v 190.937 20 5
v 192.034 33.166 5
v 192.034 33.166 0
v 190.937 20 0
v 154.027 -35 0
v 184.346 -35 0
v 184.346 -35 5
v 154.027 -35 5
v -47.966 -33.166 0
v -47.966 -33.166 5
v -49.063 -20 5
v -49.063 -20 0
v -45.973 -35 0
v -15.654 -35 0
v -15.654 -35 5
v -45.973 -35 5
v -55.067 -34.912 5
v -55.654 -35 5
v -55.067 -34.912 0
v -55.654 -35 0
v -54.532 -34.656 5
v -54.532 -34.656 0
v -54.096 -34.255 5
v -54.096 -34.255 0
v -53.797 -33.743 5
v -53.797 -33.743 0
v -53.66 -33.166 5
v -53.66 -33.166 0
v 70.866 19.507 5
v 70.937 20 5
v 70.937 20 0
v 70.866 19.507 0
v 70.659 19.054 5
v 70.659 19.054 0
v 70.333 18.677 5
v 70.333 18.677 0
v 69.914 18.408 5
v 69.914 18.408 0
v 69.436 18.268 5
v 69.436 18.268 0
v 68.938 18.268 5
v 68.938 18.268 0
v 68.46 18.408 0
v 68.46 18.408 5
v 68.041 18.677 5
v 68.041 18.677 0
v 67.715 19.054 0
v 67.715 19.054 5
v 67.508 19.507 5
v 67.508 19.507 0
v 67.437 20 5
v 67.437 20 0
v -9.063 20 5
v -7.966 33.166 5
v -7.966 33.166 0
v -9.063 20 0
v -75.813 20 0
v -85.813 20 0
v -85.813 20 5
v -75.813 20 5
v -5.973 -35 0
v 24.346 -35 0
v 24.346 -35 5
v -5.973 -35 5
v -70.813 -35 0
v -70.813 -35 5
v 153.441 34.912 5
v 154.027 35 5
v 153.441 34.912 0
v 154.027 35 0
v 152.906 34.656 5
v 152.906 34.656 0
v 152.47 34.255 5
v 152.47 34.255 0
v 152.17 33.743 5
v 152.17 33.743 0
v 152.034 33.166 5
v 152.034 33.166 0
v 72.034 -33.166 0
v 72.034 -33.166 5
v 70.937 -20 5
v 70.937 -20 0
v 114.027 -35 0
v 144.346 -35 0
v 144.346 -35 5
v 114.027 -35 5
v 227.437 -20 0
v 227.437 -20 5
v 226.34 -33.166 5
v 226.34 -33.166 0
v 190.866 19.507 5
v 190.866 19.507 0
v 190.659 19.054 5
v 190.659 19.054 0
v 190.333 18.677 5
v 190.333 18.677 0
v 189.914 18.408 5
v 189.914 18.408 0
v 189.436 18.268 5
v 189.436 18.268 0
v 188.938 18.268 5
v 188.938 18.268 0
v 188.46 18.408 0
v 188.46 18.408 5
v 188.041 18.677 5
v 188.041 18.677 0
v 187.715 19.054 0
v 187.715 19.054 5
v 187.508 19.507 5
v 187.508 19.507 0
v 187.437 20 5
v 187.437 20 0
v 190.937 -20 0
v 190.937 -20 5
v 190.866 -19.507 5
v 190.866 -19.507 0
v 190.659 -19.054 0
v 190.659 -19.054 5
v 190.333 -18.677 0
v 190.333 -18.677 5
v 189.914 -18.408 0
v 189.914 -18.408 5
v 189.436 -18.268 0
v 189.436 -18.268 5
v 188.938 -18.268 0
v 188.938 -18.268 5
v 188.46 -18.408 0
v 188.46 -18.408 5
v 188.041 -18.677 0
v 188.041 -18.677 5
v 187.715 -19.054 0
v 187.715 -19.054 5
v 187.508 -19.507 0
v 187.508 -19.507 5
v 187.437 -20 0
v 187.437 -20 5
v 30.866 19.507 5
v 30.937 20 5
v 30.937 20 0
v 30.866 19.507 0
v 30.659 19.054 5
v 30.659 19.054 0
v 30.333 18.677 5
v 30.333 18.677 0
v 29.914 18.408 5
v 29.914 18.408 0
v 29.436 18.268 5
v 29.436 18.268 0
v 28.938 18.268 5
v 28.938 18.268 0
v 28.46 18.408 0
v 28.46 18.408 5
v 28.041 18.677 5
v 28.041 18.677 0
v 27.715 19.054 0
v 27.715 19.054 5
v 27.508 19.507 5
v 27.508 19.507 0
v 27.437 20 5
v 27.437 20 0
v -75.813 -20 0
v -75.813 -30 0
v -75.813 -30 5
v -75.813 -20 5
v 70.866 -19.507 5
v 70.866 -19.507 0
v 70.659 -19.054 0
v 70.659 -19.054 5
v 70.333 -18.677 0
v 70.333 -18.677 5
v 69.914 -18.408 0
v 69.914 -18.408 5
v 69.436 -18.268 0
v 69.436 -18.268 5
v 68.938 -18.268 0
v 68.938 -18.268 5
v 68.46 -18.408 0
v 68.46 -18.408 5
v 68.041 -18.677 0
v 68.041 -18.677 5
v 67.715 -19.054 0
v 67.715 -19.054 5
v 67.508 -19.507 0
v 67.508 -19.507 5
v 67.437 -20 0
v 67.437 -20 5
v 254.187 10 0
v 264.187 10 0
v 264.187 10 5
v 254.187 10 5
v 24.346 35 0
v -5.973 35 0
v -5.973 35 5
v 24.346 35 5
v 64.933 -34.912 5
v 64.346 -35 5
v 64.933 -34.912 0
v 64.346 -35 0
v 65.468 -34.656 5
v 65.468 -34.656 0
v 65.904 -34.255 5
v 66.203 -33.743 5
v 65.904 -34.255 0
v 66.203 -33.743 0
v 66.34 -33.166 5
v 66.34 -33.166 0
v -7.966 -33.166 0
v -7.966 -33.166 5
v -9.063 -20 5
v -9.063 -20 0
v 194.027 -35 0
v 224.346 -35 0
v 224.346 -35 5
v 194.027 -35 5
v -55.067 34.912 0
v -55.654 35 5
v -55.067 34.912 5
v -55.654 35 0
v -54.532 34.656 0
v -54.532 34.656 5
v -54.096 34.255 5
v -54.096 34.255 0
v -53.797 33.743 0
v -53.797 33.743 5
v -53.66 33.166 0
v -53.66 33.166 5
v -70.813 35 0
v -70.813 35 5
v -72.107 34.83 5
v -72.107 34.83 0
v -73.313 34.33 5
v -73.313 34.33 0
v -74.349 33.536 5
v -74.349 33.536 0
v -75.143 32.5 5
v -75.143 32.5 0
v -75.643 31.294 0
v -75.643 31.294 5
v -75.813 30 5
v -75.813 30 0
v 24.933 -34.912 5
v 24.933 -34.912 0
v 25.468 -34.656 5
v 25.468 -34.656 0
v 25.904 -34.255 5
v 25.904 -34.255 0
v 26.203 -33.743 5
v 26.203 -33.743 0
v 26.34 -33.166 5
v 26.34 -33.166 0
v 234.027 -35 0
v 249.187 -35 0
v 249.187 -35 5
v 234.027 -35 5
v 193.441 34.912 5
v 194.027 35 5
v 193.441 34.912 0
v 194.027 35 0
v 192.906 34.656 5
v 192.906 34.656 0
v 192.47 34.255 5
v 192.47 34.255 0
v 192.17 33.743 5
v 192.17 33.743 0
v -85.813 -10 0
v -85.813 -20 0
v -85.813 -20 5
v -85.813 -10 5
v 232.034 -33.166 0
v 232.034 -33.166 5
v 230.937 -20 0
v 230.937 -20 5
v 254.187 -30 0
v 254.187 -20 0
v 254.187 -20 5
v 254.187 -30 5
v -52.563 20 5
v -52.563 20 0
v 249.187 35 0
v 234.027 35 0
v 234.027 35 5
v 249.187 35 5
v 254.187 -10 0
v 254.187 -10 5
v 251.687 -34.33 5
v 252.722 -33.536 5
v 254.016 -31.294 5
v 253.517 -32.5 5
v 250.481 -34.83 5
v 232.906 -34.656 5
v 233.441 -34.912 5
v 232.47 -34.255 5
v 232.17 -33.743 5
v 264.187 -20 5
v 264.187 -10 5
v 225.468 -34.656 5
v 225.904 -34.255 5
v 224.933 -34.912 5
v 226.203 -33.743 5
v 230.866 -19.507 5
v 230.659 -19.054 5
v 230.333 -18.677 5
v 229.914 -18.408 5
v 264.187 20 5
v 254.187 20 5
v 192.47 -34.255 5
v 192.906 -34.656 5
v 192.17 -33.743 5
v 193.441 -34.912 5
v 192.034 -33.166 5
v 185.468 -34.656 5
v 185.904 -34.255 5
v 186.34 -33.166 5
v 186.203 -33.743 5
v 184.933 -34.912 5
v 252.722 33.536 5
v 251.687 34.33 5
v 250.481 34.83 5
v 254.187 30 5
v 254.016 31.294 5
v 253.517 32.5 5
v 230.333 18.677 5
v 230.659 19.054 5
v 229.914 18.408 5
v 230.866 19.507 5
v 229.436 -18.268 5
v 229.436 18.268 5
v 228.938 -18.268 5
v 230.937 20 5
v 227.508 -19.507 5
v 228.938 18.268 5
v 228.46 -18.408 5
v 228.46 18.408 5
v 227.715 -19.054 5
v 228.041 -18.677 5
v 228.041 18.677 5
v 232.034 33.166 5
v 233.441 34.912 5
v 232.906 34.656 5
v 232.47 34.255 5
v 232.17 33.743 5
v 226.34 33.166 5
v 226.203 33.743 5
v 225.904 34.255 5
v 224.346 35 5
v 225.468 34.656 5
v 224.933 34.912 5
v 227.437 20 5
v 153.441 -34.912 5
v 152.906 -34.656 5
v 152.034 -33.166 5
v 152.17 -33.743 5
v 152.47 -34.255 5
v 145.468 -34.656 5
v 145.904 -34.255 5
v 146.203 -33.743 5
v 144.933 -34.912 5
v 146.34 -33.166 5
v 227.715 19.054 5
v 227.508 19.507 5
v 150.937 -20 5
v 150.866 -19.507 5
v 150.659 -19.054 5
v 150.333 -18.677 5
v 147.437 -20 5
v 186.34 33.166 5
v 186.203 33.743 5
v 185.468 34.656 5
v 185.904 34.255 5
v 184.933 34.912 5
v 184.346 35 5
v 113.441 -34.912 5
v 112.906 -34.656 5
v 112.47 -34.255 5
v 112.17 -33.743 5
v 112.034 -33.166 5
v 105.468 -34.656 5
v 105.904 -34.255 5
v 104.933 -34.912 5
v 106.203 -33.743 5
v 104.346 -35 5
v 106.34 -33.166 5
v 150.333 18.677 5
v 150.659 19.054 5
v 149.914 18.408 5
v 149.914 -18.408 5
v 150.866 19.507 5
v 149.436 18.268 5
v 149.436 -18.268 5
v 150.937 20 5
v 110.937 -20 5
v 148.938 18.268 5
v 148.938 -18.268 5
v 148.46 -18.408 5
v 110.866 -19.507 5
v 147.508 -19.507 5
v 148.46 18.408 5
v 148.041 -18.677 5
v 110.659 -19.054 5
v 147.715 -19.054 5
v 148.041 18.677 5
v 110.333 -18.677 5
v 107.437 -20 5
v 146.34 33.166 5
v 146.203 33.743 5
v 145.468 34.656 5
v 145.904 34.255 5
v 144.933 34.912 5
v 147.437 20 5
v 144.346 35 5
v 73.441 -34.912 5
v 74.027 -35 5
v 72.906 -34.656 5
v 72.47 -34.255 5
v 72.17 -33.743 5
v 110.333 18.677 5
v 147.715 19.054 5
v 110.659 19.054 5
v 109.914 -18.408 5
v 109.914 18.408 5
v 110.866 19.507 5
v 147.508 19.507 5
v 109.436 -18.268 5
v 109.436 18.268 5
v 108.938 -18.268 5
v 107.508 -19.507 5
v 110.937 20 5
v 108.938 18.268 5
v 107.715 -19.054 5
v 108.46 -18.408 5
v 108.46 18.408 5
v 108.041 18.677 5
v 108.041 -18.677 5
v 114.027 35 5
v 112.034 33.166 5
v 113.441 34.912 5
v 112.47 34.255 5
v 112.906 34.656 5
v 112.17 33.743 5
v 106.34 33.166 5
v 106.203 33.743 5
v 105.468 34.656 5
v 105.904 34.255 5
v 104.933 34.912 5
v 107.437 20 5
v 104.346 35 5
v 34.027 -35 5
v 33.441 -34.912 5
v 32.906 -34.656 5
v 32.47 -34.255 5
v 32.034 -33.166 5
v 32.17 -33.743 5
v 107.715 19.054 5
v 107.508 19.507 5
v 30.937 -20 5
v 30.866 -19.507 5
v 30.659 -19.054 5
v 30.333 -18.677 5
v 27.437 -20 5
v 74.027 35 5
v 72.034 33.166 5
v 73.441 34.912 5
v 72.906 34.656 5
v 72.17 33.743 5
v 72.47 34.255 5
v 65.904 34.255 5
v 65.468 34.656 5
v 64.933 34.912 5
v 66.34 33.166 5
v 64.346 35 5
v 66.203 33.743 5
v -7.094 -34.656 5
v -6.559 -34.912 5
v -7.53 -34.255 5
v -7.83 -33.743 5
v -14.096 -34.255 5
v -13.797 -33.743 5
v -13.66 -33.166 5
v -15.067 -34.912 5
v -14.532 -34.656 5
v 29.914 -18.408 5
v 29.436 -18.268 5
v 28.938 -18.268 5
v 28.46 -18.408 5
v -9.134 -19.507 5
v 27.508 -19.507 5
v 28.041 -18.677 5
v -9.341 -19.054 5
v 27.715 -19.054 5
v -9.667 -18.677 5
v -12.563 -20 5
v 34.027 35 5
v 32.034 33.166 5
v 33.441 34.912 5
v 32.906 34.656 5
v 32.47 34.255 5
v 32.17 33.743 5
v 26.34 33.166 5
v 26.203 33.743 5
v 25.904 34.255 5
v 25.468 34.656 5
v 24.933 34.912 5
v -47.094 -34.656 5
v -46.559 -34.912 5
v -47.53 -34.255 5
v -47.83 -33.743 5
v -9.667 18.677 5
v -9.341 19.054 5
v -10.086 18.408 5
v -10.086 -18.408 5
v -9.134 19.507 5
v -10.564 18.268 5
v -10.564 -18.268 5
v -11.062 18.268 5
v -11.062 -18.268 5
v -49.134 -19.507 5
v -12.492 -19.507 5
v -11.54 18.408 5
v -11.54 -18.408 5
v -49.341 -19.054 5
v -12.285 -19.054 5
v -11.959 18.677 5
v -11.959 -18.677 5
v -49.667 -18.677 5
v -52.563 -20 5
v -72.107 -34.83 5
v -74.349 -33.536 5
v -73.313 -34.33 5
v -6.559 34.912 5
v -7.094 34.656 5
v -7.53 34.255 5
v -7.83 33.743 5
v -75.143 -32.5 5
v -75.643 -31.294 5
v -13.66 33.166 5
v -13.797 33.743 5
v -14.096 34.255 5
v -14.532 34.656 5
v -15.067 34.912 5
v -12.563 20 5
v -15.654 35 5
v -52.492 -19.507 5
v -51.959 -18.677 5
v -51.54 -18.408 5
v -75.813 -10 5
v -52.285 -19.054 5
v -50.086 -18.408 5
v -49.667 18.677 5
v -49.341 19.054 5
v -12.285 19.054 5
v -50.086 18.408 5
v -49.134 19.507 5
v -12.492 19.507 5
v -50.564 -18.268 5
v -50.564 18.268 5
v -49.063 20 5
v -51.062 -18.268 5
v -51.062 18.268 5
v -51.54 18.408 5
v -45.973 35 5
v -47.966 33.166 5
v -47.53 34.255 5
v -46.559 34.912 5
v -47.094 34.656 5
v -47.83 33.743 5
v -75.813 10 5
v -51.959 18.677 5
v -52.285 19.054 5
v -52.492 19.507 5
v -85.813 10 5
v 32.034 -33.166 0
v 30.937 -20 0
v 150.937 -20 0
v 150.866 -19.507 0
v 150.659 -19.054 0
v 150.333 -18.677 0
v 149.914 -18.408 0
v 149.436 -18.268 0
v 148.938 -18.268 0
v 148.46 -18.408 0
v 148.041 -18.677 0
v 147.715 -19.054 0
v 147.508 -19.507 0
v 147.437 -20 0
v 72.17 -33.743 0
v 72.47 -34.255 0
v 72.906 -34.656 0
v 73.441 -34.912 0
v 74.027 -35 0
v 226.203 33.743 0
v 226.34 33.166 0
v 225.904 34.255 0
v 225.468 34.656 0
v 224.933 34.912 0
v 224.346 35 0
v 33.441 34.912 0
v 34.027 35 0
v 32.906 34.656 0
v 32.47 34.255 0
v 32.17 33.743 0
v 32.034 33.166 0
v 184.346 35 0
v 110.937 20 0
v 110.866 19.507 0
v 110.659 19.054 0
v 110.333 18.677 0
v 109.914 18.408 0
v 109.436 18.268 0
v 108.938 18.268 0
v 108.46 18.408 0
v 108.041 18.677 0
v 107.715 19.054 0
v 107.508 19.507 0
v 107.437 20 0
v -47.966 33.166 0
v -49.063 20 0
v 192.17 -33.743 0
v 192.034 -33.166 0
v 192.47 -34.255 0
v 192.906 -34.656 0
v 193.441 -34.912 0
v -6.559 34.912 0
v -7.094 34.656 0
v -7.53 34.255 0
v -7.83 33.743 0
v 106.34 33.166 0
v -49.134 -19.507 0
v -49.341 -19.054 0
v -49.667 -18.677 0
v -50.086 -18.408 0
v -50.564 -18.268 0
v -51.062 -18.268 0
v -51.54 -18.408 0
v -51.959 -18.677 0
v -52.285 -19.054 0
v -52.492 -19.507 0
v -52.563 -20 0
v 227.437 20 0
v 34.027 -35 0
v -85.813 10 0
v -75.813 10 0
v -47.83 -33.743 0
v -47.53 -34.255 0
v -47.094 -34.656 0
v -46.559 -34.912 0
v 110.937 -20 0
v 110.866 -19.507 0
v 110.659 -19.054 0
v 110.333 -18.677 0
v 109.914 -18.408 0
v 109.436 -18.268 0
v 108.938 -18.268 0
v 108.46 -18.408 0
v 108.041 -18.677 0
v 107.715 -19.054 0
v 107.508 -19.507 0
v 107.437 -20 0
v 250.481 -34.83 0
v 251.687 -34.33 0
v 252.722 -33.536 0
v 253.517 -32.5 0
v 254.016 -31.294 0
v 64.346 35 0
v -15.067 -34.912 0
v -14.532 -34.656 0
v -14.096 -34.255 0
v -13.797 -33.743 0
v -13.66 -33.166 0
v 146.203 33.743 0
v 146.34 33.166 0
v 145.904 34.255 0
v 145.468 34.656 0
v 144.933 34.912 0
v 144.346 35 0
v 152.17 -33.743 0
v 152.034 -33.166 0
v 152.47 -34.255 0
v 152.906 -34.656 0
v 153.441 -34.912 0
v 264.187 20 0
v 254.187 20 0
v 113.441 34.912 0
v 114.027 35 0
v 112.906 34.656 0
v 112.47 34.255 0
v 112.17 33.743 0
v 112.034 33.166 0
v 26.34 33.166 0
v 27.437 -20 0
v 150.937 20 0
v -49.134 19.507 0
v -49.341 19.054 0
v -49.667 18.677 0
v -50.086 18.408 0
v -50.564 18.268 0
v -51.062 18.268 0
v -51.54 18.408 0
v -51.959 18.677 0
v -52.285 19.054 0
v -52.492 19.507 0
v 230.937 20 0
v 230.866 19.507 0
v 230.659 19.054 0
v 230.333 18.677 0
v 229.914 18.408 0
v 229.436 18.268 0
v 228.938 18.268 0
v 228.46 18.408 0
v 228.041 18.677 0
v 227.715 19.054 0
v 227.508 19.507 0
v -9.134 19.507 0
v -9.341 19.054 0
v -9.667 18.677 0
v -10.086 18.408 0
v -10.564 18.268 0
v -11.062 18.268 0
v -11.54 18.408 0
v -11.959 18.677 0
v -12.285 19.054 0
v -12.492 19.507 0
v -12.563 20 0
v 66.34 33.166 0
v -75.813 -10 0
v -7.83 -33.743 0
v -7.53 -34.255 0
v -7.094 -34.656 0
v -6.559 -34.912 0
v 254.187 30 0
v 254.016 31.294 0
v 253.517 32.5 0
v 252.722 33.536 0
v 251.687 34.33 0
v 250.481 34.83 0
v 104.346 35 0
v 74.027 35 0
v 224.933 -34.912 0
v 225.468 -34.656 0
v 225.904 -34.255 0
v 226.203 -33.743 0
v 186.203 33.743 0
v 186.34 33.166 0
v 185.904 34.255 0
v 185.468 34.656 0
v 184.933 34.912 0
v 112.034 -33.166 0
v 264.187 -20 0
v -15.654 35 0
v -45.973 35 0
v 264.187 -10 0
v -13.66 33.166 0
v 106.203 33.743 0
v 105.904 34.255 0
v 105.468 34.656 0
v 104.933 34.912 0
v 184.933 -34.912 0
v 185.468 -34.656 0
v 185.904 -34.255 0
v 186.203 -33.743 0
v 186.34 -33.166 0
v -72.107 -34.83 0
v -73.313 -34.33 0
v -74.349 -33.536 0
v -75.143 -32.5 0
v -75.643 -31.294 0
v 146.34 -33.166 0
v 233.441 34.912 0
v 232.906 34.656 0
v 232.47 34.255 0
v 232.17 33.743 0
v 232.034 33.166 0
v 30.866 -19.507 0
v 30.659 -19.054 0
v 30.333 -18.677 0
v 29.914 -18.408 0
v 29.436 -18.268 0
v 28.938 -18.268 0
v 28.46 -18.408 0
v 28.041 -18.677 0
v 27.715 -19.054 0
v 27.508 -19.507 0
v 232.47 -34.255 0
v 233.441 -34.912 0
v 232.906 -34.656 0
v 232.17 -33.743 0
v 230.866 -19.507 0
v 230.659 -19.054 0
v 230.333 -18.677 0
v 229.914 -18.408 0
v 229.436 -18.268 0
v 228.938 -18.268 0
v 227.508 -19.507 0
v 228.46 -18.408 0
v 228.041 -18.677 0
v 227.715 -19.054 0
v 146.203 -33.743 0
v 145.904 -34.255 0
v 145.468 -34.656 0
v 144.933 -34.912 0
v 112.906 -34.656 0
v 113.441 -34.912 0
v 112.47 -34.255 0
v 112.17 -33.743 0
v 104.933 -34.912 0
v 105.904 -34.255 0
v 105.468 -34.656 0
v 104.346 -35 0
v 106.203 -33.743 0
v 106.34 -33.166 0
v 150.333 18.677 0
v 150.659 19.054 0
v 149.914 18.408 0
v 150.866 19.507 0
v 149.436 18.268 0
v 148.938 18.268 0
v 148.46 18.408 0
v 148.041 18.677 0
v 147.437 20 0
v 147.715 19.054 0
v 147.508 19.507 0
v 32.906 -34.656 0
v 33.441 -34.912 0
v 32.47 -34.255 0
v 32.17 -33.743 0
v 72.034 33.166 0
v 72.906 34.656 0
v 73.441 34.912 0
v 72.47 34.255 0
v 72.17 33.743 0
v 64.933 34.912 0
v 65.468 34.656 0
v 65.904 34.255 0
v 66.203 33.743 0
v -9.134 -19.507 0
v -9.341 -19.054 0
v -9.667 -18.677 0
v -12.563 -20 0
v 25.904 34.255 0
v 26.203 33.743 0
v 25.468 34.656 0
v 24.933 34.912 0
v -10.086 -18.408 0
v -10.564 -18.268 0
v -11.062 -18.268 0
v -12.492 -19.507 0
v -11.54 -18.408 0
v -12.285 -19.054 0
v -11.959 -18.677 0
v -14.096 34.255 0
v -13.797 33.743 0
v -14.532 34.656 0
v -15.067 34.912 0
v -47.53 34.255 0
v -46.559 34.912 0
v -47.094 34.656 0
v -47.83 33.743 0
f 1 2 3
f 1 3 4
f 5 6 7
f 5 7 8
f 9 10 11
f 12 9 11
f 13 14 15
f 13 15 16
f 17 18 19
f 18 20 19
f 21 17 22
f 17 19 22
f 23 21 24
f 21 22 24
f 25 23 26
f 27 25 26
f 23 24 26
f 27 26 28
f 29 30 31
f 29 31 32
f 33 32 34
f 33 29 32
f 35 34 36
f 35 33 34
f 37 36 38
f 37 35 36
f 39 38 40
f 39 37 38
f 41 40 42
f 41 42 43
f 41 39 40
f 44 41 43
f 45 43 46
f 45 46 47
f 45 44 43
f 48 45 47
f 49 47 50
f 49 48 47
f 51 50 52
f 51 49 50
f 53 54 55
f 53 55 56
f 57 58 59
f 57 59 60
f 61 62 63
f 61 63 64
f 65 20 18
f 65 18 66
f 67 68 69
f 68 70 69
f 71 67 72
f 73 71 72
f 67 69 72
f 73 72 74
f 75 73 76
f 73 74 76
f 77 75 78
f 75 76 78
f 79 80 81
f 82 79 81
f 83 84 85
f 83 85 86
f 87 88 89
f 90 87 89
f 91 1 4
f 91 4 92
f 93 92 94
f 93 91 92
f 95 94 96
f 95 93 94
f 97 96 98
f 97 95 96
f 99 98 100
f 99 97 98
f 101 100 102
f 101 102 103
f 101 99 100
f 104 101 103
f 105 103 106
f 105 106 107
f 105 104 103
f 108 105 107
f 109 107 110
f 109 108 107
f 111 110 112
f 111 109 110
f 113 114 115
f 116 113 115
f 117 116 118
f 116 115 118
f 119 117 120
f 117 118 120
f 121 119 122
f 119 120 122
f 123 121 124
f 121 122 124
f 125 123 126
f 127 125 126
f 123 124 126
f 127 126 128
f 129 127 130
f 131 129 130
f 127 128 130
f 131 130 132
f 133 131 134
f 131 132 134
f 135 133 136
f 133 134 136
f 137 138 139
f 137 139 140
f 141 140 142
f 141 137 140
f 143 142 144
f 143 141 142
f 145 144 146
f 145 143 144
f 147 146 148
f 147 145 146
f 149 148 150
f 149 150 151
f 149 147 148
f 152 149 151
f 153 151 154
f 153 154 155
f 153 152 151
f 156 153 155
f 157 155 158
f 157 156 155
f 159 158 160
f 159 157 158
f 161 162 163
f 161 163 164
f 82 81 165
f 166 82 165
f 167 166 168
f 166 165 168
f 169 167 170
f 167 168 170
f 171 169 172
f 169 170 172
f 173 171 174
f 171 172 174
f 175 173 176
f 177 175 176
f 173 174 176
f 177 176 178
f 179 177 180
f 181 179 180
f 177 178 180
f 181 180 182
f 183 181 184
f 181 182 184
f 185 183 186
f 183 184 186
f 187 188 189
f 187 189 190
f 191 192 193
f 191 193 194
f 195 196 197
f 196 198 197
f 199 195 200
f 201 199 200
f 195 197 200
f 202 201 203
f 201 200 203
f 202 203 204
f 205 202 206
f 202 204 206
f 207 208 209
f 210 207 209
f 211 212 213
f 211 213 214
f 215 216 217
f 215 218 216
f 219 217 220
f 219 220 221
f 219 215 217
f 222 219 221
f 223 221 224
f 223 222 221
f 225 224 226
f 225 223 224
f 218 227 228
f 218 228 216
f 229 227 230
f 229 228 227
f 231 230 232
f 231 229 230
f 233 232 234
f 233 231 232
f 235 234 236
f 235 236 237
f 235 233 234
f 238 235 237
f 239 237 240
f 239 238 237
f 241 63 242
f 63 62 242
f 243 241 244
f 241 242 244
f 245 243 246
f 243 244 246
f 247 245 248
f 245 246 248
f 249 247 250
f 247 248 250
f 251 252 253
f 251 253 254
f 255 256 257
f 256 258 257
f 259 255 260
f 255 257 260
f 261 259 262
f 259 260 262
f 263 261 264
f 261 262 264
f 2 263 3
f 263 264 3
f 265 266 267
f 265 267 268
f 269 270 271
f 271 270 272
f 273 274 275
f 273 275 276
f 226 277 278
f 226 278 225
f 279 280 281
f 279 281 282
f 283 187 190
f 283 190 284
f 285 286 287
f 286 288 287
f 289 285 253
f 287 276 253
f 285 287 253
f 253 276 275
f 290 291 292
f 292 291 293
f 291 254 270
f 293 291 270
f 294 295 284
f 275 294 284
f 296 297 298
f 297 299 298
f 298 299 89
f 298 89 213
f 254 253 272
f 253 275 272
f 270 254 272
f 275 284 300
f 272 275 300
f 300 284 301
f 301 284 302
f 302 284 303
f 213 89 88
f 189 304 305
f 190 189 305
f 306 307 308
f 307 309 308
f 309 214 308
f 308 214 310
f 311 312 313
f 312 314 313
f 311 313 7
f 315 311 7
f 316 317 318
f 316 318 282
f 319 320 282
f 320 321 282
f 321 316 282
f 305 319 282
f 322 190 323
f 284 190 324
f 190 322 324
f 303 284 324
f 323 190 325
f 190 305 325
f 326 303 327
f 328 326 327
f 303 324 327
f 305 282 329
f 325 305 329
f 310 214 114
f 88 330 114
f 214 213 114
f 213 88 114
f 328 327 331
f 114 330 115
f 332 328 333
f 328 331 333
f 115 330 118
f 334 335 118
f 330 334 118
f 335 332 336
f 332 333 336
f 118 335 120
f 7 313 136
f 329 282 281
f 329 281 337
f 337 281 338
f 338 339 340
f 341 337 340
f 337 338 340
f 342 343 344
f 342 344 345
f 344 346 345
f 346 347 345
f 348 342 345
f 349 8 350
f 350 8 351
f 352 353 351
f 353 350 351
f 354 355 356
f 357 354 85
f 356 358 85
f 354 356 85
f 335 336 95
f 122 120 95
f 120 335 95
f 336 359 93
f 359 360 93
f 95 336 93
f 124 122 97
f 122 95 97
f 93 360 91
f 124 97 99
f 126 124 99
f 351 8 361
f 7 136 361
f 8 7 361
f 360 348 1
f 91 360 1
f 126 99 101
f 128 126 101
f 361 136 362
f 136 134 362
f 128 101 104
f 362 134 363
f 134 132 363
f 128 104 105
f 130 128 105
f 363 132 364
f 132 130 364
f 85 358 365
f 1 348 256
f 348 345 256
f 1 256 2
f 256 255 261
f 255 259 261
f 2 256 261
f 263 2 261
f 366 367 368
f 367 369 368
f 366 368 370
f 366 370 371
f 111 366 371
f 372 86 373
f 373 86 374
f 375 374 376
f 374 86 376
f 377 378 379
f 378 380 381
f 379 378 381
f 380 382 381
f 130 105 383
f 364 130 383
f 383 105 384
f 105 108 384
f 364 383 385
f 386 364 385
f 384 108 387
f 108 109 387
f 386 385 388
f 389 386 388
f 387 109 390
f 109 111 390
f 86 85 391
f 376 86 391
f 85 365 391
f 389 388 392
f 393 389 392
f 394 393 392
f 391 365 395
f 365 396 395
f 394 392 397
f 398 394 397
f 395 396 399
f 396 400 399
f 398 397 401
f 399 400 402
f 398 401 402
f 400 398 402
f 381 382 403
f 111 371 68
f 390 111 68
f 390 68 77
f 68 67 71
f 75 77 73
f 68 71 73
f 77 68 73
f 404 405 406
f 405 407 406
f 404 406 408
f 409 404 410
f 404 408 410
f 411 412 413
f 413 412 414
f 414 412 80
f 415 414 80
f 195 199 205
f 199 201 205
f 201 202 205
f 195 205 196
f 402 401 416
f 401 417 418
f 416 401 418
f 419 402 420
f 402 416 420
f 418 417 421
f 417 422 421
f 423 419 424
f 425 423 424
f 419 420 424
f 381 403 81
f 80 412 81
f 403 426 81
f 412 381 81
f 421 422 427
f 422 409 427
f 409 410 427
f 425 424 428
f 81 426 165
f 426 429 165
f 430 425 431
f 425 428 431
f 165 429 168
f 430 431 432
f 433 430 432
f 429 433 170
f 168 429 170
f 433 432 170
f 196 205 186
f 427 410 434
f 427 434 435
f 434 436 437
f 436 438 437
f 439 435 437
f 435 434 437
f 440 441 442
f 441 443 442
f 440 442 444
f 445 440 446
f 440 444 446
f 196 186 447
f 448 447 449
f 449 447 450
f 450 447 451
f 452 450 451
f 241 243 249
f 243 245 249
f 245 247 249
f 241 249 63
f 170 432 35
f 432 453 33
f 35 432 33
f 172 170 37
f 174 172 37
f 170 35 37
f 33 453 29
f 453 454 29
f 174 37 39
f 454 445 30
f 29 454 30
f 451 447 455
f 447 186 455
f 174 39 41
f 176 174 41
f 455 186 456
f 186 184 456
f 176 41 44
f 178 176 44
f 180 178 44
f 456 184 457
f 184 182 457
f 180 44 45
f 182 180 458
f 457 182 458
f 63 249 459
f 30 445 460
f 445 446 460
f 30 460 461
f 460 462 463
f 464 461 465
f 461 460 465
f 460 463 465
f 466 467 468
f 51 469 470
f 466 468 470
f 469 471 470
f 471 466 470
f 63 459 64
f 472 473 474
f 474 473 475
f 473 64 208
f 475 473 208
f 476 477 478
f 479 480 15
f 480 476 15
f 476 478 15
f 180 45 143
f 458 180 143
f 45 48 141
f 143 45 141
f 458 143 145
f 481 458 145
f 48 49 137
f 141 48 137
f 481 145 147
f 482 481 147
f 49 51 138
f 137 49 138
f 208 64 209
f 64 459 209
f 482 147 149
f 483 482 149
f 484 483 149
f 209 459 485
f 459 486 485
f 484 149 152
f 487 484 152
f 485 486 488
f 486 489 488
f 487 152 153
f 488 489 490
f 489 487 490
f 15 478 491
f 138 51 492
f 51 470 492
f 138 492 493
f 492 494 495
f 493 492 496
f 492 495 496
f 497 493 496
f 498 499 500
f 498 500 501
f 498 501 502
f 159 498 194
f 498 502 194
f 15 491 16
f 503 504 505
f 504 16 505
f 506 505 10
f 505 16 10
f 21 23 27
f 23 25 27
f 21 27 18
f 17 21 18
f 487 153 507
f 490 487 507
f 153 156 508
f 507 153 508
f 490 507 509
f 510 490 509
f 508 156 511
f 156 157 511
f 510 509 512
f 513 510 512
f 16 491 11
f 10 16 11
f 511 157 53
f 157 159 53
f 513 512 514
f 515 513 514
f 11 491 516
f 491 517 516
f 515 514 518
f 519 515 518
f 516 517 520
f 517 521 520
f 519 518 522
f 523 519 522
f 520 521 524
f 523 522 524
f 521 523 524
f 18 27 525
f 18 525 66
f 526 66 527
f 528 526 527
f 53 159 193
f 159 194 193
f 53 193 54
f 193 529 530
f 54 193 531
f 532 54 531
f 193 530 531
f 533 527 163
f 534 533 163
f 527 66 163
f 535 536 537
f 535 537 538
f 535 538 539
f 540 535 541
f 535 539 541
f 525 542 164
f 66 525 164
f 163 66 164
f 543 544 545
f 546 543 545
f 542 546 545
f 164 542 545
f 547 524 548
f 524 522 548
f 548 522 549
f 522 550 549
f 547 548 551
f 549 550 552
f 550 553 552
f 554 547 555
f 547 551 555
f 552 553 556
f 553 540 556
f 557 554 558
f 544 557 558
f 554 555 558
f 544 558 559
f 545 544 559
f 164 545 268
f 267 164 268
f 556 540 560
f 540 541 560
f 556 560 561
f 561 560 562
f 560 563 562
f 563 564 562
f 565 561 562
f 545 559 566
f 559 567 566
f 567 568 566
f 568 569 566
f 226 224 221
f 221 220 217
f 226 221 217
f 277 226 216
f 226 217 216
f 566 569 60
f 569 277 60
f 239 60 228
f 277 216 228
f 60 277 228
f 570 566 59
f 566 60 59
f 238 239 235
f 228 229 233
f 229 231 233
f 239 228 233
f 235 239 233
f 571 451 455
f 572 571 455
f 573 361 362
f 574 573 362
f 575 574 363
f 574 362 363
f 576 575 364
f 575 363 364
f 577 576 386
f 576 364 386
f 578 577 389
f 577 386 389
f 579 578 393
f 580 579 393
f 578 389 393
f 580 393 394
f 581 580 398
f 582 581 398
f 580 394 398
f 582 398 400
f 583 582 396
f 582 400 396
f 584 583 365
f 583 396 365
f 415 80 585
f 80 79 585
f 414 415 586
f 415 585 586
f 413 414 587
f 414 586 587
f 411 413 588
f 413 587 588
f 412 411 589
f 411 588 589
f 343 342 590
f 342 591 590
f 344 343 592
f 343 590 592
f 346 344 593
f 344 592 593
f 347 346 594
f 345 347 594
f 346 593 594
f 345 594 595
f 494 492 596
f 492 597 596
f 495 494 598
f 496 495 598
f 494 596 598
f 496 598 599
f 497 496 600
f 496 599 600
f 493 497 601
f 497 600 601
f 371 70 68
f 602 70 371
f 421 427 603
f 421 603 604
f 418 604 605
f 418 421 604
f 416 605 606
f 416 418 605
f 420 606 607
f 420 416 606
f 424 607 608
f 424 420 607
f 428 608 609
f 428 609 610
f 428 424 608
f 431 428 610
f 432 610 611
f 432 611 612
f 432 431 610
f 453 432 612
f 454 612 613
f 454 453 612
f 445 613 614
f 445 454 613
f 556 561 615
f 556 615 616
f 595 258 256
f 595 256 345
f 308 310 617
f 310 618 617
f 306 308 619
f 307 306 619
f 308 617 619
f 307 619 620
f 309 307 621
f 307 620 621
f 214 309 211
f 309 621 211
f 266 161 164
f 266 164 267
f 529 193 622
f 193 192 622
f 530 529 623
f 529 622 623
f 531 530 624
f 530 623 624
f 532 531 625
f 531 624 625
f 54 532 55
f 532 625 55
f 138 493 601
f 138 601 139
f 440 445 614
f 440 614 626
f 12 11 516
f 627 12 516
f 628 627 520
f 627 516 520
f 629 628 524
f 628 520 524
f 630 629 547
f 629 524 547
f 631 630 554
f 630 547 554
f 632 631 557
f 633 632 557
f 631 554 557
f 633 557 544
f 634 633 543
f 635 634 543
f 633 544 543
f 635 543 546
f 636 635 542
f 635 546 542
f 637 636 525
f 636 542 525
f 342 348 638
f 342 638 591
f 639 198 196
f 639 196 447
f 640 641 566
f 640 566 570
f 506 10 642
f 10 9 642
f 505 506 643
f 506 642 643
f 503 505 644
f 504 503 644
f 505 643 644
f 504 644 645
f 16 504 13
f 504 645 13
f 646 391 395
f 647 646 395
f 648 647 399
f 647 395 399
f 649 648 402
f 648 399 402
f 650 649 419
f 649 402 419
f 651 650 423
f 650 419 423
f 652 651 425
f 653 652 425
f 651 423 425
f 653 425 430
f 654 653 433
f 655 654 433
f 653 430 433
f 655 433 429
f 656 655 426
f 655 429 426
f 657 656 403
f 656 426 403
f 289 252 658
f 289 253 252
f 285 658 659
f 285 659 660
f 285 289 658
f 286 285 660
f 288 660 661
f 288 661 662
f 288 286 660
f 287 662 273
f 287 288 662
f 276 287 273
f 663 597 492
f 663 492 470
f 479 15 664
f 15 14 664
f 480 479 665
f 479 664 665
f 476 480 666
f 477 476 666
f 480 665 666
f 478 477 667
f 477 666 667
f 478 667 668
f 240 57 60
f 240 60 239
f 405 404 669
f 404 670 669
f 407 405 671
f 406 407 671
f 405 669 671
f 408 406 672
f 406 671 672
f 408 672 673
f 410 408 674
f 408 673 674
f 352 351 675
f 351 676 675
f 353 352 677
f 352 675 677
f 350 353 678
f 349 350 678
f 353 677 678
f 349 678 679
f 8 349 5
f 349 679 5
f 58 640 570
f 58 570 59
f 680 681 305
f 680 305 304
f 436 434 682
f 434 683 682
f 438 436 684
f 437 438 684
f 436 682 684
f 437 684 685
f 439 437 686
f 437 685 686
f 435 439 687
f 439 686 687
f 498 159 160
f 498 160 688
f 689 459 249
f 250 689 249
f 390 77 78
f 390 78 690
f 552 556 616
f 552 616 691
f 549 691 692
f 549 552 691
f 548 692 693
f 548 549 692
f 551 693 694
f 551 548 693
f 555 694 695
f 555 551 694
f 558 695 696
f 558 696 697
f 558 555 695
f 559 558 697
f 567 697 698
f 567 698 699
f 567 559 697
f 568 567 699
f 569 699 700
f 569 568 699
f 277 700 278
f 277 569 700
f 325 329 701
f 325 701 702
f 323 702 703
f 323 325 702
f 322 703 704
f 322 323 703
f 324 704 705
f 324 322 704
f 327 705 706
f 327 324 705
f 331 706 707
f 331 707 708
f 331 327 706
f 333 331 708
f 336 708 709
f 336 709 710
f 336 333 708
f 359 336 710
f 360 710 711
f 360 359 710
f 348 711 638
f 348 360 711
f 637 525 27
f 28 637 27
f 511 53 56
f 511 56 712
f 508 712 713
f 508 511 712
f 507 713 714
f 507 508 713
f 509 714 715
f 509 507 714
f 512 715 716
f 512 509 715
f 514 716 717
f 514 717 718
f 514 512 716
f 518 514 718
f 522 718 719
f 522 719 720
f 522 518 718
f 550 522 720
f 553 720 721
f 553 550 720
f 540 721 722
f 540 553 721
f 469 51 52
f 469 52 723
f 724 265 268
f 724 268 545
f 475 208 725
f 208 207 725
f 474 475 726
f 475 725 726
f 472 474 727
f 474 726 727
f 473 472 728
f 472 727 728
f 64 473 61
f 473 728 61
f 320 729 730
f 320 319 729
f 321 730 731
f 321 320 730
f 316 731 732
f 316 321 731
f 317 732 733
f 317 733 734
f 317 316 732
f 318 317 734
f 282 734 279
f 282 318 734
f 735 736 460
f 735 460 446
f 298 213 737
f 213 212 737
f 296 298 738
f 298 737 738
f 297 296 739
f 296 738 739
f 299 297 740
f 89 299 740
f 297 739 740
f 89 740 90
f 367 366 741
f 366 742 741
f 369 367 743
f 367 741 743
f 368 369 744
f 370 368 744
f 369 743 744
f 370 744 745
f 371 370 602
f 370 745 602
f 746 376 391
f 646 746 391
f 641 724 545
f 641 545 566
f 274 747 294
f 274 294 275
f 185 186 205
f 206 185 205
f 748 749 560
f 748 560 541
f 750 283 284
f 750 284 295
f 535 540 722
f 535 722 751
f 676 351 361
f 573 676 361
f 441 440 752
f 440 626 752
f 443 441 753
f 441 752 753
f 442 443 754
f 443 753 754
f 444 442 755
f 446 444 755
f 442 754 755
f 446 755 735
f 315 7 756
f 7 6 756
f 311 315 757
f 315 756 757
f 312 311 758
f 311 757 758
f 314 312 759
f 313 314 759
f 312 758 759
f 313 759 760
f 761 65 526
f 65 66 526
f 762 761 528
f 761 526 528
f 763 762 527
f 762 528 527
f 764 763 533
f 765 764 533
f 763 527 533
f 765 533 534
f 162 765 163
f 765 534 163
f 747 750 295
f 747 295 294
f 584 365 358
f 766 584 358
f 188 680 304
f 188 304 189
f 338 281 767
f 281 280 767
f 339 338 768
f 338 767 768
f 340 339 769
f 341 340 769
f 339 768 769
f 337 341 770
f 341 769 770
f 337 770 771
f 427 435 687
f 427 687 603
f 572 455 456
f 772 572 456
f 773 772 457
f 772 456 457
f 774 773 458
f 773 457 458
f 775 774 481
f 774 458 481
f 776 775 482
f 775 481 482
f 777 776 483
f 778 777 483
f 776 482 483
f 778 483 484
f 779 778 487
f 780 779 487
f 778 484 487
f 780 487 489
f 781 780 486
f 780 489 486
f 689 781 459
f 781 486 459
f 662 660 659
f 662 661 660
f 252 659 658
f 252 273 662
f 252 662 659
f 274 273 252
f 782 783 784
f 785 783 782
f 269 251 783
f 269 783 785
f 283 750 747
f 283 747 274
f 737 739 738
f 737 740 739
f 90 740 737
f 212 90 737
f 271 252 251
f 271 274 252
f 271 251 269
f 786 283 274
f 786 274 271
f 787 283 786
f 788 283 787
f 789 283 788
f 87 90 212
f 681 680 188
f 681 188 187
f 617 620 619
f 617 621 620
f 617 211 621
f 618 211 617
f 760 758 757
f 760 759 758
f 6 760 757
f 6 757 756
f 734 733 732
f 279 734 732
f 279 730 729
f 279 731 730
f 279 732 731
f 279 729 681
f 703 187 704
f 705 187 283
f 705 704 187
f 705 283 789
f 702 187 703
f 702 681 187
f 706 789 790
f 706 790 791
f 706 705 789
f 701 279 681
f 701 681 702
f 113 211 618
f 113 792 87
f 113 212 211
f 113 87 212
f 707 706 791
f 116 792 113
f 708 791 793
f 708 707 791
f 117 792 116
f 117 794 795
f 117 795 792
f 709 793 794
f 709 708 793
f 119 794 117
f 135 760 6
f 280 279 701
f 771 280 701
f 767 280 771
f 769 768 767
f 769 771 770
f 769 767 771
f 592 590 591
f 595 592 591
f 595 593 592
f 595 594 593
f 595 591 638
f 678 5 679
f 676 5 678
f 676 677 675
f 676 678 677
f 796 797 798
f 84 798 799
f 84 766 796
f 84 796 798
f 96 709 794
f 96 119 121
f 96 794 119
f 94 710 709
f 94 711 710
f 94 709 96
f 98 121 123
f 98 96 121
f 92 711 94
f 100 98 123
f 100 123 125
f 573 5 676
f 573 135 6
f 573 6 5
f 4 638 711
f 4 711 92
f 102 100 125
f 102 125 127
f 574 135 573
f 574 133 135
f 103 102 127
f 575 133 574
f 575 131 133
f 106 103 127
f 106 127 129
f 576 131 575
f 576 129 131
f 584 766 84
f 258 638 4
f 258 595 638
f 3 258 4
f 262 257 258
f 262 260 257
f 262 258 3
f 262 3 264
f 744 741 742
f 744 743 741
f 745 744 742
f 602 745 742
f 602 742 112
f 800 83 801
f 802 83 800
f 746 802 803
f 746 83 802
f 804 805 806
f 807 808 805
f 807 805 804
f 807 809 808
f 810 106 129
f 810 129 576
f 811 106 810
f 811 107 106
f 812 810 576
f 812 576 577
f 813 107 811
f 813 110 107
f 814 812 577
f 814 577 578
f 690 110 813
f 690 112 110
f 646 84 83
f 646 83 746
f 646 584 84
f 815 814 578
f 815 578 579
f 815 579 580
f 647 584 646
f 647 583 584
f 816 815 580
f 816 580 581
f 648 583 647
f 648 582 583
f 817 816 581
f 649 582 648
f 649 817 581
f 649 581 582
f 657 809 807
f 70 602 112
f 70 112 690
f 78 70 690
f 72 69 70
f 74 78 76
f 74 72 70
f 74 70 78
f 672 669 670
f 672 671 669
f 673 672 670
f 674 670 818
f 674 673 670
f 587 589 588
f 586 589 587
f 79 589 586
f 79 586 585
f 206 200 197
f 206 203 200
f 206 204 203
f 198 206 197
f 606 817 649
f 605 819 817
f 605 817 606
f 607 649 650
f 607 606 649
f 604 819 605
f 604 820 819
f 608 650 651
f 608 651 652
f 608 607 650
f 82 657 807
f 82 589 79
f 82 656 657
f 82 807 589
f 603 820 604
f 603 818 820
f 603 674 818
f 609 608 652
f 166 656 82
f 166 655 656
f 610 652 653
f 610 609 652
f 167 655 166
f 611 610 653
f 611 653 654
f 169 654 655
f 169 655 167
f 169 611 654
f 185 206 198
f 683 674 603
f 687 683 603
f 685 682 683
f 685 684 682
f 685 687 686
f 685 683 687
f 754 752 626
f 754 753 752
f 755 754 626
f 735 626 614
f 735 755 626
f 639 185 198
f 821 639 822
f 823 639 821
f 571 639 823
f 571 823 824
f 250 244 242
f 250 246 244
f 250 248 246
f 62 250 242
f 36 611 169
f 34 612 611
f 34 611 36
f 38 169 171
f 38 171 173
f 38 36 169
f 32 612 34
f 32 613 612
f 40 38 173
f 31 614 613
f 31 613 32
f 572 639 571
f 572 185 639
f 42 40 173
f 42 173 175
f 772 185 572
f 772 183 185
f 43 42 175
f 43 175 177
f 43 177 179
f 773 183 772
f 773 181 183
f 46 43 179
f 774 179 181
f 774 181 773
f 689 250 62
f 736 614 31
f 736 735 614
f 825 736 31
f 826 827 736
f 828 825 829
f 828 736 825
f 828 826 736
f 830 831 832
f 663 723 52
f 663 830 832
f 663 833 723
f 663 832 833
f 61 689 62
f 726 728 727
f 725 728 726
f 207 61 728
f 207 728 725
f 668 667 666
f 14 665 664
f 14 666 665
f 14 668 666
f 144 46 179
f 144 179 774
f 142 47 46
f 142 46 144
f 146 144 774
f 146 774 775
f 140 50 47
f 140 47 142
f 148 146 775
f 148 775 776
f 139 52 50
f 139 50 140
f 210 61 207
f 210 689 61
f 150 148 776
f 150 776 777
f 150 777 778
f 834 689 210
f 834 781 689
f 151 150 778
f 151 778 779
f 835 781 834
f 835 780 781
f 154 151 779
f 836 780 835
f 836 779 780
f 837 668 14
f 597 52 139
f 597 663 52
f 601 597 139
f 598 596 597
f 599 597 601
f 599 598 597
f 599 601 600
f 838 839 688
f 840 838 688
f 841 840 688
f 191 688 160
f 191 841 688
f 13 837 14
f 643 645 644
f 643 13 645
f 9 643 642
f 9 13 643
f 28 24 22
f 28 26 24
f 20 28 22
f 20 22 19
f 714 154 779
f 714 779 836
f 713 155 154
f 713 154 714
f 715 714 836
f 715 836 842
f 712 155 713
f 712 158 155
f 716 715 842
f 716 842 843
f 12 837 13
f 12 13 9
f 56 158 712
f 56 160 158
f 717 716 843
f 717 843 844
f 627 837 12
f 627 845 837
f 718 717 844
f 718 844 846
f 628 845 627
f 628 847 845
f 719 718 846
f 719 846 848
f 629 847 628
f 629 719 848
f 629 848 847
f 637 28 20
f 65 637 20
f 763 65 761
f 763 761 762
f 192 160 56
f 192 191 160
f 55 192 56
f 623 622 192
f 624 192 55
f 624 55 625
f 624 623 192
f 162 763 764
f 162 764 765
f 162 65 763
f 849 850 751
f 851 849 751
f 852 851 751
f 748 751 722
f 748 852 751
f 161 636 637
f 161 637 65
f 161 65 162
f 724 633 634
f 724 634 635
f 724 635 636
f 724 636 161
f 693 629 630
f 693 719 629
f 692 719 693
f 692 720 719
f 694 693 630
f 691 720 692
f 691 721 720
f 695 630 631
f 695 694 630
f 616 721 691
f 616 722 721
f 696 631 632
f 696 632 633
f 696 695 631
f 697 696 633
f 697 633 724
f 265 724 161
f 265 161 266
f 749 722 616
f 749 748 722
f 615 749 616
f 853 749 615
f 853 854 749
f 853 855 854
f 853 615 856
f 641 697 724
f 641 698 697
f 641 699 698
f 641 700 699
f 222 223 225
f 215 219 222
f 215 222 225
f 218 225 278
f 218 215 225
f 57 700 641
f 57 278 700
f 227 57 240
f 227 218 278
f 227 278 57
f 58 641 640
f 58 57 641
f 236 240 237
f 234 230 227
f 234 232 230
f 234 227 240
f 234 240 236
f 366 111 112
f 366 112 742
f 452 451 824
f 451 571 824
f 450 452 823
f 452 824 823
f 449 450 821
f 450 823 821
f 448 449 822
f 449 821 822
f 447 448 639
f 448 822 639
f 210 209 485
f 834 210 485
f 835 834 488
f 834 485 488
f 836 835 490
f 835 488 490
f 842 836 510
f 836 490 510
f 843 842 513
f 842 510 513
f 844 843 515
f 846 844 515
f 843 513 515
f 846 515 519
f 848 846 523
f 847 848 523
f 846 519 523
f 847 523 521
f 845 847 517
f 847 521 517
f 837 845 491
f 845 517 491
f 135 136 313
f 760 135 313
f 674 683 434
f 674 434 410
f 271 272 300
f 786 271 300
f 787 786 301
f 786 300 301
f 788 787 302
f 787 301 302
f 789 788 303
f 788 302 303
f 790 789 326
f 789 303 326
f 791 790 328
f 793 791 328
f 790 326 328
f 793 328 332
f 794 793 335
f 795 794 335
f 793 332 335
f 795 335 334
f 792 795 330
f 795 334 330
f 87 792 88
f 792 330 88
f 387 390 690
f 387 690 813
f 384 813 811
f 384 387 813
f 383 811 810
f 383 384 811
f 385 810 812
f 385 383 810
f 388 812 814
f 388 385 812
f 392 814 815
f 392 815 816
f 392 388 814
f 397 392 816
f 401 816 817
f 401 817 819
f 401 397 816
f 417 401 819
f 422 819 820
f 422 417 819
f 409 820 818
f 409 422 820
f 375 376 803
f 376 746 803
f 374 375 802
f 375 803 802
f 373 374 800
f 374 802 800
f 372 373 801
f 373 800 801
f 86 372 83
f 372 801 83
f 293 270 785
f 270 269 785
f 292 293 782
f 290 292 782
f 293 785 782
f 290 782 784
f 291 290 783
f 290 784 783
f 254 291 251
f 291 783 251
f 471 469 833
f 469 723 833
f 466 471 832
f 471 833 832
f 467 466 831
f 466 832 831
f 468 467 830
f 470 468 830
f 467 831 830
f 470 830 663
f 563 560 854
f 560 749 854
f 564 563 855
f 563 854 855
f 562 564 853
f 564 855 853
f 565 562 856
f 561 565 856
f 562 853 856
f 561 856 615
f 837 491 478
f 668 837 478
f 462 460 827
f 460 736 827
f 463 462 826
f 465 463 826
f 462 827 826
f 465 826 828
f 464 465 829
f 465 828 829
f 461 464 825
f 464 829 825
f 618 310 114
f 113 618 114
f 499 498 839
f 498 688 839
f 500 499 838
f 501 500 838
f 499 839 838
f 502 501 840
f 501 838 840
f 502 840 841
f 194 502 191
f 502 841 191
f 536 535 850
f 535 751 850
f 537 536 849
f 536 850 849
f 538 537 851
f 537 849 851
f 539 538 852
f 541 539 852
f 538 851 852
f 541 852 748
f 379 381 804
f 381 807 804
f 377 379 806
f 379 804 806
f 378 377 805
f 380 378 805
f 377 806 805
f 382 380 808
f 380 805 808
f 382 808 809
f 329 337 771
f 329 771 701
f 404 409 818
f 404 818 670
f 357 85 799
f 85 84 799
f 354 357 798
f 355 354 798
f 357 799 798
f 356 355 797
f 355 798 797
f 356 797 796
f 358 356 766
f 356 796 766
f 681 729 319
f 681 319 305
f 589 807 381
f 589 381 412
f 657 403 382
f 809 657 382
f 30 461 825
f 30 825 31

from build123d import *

# Parameters (mm, degrees)
BOSS_EXTRUDE1_DEPTH = 5
CUT_EXTRUDE1_DEPTH  = 5
FILLET1_R           = 2
CONG_1_R            = 5


with BuildPart() as part:
    # Sketch1 → Boss-Extrude1 (new body)
    with BuildSketch(Plane.XY):
        Polygon((-75.813253012, 35), (254.186746988, 35), (254.186746988, 20), (264.186746988, 20), (264.186746988, 10), (254.186746988, 10), (254.186746988, -10), (264.186746988, -10), (264.186746988, -20), (254.186746988, -20), (254.186746988, -35), (-75.813253012, -35), (-75.813253012, -20), (-85.813253012, -20), (-85.813253012, -10), (-75.813253012, -10), (-75.813253012, 10), (-85.813253012, 10), (-85.813253012, 20), (-75.813253012, 20), align=None)
    extrude(amount=BOSS_EXTRUDE1_DEPTH)

    # Sketch2 → Cut-Extrude1 (cut)
    with BuildSketch(Plane.XY.offset(5)):
        with BuildLine():
            Line((-53.813253012, 35), (-47.813253012, 35))
            Line((-47.813253012, 35), (-49.063253012, 20))
            ThreePointArc((-49.063253012, 20), (-50.813253012, 18.25), (-52.563253012, 20))
            Line((-52.563253012, 20), (-53.813253012, 35))
        make_face()
        with BuildLine():
            Line((-13.813253012, 35), (-7.813253012, 35))
            Line((-7.813253012, 35), (-9.063253012, 20))
            ThreePointArc((-9.063253012, 20), (-10.813253012, 18.25), (-12.563253012, 20))
            Line((-12.563253012, 20), (-13.813253012, 35))
        make_face()
        with BuildLine():
            Line((26.186746988, 35), (32.186746988, 35))
            Line((32.186746988, 35), (30.936746988, 20))
            ThreePointArc((30.936746988, 20), (29.186746988, 18.25), (27.436746988, 20))
            Line((27.436746988, 20), (26.186746988, 35))
        make_face()
        with BuildLine():
            Line((66.186746988, 35), (72.186746988, 35))
            Line((72.186746988, 35), (70.936746988, 20))
            ThreePointArc((70.936746988, 20), (69.186746988, 18.25), (67.436746988, 20))
            Line((67.436746988, 20), (66.186746988, 35))
        make_face()
        with BuildLine():
            Line((106.186746988, 35), (112.186746988, 35))
            Line((112.186746988, 35), (110.936746988, 20))
            ThreePointArc((110.936746988, 20), (109.186746988, 18.25), (107.436746988, 20))
            Line((107.436746988, 20), (106.186746988, 35))
        make_face()
        with BuildLine():
            Line((146.186746988, 35), (152.186746988, 35))
            Line((152.186746988, 35), (150.936746988, 20))
            ThreePointArc((150.936746988, 20), (149.186746988, 18.25), (147.436746988, 20))
            Line((147.436746988, 20), (146.186746988, 35))
        make_face()
        with BuildLine():
            Line((186.186746988, 35), (192.186746988, 35))
            Line((192.186746988, 35), (190.936746988, 20))
            ThreePointArc((190.936746988, 20), (189.186746988, 18.25), (187.436746988, 20))
            Line((187.436746988, 20), (186.186746988, 35))
        make_face()
        with BuildLine():
            Line((226.186746988, 35), (232.186746988, 35))
            Line((232.186746988, 35), (230.936746988, 20))
            ThreePointArc((230.936746988, 20), (229.186746988, 18.25), (227.436746988, 20))
            Line((227.436746988, 20), (226.186746988, 35))
        make_face()
        with BuildLine():
            Line((232.186746988, -35), (230.936746988, -20))
            ThreePointArc((230.936746988, -20), (229.186746988, -18.25), (227.436746988, -20))
            Line((227.436746988, -20), (226.186746988, -35))
            Line((226.186746988, -35), (232.186746988, -35))
        make_face()
        with BuildLine():
            Line((192.186746988, -35), (190.936746988, -20))
            ThreePointArc((190.936746988, -20), (189.186746988, -18.25), (187.436746988, -20))
            Line((187.436746988, -20), (186.186746988, -35))
            Line((186.186746988, -35), (192.186746988, -35))
        make_face()
        with BuildLine():
            Line((152.186746988, -35), (150.936746988, -20))
            ThreePointArc((150.936746988, -20), (149.186746988, -18.25), (147.436746988, -20))
            Line((147.436746988, -20), (146.186746988, -35))
            Line((146.186746988, -35), (152.186746988, -35))
        make_face()
        with BuildLine():
            Line((112.186746988, -35), (110.936746988, -20))
            ThreePointArc((110.936746988, -20), (109.186746988, -18.25), (107.436746988, -20))
            Line((107.436746988, -20), (106.186746988, -35))
            Line((106.186746988, -35), (112.186746988, -35))
        make_face()
        with BuildLine():
            Line((72.186746988, -35), (70.936746988, -20))
            ThreePointArc((70.936746988, -20), (69.186746988, -18.25), (67.436746988, -20))
            Line((67.436746988, -20), (66.186746988, -35))
            Line((66.186746988, -35), (72.186746988, -35))
        make_face()
        with BuildLine():
            Line((32.186746988, -35), (30.936746988, -20))
            ThreePointArc((30.936746988, -20), (29.186746988, -18.25), (27.436746988, -20))
            Line((27.436746988, -20), (26.186746988, -35))
            Line((26.186746988, -35), (32.186746988, -35))
        make_face()
        with BuildLine():
            Line((-7.813253012, -35), (-9.063253012, -20))
            ThreePointArc((-9.063253012, -20), (-10.813253012, -18.25), (-12.563253012, -20))
            Line((-12.563253012, -20), (-13.813253012, -35))
            Line((-13.813253012, -35), (-7.813253012, -35))
        make_face()
        with BuildLine():
            Line((-47.813253012, -35), (-49.063253012, -20))
            ThreePointArc((-49.063253012, -20), (-50.813253012, -18.25), (-52.563253012, -20))
            Line((-52.563253012, -20), (-53.813253012, -35))
            Line((-53.813253012, -35), (-47.813253012, -35))
        make_face()
    extrude(amount=-CUT_EXTRUDE1_DEPTH, mode=Mode.SUBTRACT)

    # Fillet1
    fillet1_edges = [part.edges().sort_by_distance(p)[0] for p in [
        (-13.813253012, 35, 2.5),
        (-7.813253012, 35, 2.5),
        (26.186746988, 35, 2.5),
        (32.186746988, 35, 2.5),
        (66.186746988, 35, 2.5),
        (72.186746988, 35, 2.5),
        (106.186746988, 35, 2.5),
        (112.186746988, 35, 2.5),
        (146.186746988, 35, 2.5),
        (152.186746988, 35, 2.5),
        (186.186746988, 35, 2.5),
        (192.186746988, 35, 2.5),
        (226.186746988, 35, 2.5),
        (232.186746988, 35, 2.5),
        (232.186746988, -35, 2.5),
        (226.186746988, -35, 2.5),
        (192.186746988, -35, 2.5),
        (186.186746988, -35, 2.5),
        (152.186746988, -35, 2.5),
        (146.186746988, -35, 2.5),
        (112.186746988, -35, 2.5),
        (106.186746988, -35, 2.5),
        (72.186746988, -35, 2.5),
        (66.186746988, -35, 2.5),
        (32.186746988, -35, 2.5),
        (26.186746988, -35, 2.5),
        (-7.813253012, -35, 2.5),
        (-13.813253012, -35, 2.5),
        (-47.813253012, -35, 2.5),
        (-53.813253012, -35, 2.5),
        (-53.813253012, 35, 2.5),
        (-47.813253012, 35, 2.5),
    ]]
    fillet(fillet1_edges, radius=FILLET1_R)

    # Congé1
    cong_1_edges = [part.edges().sort_by_distance(p)[0] for p in [
        (-75.813253012, 35, 2.5),
        (254.186746988, 35, 2.5),
        (254.186746988, -35, 2.5),
        (-75.813253012, -35, 2.5),
    ]]
    fillet(cong_1_edges, radius=CONG_1_R)


solid = part.part
